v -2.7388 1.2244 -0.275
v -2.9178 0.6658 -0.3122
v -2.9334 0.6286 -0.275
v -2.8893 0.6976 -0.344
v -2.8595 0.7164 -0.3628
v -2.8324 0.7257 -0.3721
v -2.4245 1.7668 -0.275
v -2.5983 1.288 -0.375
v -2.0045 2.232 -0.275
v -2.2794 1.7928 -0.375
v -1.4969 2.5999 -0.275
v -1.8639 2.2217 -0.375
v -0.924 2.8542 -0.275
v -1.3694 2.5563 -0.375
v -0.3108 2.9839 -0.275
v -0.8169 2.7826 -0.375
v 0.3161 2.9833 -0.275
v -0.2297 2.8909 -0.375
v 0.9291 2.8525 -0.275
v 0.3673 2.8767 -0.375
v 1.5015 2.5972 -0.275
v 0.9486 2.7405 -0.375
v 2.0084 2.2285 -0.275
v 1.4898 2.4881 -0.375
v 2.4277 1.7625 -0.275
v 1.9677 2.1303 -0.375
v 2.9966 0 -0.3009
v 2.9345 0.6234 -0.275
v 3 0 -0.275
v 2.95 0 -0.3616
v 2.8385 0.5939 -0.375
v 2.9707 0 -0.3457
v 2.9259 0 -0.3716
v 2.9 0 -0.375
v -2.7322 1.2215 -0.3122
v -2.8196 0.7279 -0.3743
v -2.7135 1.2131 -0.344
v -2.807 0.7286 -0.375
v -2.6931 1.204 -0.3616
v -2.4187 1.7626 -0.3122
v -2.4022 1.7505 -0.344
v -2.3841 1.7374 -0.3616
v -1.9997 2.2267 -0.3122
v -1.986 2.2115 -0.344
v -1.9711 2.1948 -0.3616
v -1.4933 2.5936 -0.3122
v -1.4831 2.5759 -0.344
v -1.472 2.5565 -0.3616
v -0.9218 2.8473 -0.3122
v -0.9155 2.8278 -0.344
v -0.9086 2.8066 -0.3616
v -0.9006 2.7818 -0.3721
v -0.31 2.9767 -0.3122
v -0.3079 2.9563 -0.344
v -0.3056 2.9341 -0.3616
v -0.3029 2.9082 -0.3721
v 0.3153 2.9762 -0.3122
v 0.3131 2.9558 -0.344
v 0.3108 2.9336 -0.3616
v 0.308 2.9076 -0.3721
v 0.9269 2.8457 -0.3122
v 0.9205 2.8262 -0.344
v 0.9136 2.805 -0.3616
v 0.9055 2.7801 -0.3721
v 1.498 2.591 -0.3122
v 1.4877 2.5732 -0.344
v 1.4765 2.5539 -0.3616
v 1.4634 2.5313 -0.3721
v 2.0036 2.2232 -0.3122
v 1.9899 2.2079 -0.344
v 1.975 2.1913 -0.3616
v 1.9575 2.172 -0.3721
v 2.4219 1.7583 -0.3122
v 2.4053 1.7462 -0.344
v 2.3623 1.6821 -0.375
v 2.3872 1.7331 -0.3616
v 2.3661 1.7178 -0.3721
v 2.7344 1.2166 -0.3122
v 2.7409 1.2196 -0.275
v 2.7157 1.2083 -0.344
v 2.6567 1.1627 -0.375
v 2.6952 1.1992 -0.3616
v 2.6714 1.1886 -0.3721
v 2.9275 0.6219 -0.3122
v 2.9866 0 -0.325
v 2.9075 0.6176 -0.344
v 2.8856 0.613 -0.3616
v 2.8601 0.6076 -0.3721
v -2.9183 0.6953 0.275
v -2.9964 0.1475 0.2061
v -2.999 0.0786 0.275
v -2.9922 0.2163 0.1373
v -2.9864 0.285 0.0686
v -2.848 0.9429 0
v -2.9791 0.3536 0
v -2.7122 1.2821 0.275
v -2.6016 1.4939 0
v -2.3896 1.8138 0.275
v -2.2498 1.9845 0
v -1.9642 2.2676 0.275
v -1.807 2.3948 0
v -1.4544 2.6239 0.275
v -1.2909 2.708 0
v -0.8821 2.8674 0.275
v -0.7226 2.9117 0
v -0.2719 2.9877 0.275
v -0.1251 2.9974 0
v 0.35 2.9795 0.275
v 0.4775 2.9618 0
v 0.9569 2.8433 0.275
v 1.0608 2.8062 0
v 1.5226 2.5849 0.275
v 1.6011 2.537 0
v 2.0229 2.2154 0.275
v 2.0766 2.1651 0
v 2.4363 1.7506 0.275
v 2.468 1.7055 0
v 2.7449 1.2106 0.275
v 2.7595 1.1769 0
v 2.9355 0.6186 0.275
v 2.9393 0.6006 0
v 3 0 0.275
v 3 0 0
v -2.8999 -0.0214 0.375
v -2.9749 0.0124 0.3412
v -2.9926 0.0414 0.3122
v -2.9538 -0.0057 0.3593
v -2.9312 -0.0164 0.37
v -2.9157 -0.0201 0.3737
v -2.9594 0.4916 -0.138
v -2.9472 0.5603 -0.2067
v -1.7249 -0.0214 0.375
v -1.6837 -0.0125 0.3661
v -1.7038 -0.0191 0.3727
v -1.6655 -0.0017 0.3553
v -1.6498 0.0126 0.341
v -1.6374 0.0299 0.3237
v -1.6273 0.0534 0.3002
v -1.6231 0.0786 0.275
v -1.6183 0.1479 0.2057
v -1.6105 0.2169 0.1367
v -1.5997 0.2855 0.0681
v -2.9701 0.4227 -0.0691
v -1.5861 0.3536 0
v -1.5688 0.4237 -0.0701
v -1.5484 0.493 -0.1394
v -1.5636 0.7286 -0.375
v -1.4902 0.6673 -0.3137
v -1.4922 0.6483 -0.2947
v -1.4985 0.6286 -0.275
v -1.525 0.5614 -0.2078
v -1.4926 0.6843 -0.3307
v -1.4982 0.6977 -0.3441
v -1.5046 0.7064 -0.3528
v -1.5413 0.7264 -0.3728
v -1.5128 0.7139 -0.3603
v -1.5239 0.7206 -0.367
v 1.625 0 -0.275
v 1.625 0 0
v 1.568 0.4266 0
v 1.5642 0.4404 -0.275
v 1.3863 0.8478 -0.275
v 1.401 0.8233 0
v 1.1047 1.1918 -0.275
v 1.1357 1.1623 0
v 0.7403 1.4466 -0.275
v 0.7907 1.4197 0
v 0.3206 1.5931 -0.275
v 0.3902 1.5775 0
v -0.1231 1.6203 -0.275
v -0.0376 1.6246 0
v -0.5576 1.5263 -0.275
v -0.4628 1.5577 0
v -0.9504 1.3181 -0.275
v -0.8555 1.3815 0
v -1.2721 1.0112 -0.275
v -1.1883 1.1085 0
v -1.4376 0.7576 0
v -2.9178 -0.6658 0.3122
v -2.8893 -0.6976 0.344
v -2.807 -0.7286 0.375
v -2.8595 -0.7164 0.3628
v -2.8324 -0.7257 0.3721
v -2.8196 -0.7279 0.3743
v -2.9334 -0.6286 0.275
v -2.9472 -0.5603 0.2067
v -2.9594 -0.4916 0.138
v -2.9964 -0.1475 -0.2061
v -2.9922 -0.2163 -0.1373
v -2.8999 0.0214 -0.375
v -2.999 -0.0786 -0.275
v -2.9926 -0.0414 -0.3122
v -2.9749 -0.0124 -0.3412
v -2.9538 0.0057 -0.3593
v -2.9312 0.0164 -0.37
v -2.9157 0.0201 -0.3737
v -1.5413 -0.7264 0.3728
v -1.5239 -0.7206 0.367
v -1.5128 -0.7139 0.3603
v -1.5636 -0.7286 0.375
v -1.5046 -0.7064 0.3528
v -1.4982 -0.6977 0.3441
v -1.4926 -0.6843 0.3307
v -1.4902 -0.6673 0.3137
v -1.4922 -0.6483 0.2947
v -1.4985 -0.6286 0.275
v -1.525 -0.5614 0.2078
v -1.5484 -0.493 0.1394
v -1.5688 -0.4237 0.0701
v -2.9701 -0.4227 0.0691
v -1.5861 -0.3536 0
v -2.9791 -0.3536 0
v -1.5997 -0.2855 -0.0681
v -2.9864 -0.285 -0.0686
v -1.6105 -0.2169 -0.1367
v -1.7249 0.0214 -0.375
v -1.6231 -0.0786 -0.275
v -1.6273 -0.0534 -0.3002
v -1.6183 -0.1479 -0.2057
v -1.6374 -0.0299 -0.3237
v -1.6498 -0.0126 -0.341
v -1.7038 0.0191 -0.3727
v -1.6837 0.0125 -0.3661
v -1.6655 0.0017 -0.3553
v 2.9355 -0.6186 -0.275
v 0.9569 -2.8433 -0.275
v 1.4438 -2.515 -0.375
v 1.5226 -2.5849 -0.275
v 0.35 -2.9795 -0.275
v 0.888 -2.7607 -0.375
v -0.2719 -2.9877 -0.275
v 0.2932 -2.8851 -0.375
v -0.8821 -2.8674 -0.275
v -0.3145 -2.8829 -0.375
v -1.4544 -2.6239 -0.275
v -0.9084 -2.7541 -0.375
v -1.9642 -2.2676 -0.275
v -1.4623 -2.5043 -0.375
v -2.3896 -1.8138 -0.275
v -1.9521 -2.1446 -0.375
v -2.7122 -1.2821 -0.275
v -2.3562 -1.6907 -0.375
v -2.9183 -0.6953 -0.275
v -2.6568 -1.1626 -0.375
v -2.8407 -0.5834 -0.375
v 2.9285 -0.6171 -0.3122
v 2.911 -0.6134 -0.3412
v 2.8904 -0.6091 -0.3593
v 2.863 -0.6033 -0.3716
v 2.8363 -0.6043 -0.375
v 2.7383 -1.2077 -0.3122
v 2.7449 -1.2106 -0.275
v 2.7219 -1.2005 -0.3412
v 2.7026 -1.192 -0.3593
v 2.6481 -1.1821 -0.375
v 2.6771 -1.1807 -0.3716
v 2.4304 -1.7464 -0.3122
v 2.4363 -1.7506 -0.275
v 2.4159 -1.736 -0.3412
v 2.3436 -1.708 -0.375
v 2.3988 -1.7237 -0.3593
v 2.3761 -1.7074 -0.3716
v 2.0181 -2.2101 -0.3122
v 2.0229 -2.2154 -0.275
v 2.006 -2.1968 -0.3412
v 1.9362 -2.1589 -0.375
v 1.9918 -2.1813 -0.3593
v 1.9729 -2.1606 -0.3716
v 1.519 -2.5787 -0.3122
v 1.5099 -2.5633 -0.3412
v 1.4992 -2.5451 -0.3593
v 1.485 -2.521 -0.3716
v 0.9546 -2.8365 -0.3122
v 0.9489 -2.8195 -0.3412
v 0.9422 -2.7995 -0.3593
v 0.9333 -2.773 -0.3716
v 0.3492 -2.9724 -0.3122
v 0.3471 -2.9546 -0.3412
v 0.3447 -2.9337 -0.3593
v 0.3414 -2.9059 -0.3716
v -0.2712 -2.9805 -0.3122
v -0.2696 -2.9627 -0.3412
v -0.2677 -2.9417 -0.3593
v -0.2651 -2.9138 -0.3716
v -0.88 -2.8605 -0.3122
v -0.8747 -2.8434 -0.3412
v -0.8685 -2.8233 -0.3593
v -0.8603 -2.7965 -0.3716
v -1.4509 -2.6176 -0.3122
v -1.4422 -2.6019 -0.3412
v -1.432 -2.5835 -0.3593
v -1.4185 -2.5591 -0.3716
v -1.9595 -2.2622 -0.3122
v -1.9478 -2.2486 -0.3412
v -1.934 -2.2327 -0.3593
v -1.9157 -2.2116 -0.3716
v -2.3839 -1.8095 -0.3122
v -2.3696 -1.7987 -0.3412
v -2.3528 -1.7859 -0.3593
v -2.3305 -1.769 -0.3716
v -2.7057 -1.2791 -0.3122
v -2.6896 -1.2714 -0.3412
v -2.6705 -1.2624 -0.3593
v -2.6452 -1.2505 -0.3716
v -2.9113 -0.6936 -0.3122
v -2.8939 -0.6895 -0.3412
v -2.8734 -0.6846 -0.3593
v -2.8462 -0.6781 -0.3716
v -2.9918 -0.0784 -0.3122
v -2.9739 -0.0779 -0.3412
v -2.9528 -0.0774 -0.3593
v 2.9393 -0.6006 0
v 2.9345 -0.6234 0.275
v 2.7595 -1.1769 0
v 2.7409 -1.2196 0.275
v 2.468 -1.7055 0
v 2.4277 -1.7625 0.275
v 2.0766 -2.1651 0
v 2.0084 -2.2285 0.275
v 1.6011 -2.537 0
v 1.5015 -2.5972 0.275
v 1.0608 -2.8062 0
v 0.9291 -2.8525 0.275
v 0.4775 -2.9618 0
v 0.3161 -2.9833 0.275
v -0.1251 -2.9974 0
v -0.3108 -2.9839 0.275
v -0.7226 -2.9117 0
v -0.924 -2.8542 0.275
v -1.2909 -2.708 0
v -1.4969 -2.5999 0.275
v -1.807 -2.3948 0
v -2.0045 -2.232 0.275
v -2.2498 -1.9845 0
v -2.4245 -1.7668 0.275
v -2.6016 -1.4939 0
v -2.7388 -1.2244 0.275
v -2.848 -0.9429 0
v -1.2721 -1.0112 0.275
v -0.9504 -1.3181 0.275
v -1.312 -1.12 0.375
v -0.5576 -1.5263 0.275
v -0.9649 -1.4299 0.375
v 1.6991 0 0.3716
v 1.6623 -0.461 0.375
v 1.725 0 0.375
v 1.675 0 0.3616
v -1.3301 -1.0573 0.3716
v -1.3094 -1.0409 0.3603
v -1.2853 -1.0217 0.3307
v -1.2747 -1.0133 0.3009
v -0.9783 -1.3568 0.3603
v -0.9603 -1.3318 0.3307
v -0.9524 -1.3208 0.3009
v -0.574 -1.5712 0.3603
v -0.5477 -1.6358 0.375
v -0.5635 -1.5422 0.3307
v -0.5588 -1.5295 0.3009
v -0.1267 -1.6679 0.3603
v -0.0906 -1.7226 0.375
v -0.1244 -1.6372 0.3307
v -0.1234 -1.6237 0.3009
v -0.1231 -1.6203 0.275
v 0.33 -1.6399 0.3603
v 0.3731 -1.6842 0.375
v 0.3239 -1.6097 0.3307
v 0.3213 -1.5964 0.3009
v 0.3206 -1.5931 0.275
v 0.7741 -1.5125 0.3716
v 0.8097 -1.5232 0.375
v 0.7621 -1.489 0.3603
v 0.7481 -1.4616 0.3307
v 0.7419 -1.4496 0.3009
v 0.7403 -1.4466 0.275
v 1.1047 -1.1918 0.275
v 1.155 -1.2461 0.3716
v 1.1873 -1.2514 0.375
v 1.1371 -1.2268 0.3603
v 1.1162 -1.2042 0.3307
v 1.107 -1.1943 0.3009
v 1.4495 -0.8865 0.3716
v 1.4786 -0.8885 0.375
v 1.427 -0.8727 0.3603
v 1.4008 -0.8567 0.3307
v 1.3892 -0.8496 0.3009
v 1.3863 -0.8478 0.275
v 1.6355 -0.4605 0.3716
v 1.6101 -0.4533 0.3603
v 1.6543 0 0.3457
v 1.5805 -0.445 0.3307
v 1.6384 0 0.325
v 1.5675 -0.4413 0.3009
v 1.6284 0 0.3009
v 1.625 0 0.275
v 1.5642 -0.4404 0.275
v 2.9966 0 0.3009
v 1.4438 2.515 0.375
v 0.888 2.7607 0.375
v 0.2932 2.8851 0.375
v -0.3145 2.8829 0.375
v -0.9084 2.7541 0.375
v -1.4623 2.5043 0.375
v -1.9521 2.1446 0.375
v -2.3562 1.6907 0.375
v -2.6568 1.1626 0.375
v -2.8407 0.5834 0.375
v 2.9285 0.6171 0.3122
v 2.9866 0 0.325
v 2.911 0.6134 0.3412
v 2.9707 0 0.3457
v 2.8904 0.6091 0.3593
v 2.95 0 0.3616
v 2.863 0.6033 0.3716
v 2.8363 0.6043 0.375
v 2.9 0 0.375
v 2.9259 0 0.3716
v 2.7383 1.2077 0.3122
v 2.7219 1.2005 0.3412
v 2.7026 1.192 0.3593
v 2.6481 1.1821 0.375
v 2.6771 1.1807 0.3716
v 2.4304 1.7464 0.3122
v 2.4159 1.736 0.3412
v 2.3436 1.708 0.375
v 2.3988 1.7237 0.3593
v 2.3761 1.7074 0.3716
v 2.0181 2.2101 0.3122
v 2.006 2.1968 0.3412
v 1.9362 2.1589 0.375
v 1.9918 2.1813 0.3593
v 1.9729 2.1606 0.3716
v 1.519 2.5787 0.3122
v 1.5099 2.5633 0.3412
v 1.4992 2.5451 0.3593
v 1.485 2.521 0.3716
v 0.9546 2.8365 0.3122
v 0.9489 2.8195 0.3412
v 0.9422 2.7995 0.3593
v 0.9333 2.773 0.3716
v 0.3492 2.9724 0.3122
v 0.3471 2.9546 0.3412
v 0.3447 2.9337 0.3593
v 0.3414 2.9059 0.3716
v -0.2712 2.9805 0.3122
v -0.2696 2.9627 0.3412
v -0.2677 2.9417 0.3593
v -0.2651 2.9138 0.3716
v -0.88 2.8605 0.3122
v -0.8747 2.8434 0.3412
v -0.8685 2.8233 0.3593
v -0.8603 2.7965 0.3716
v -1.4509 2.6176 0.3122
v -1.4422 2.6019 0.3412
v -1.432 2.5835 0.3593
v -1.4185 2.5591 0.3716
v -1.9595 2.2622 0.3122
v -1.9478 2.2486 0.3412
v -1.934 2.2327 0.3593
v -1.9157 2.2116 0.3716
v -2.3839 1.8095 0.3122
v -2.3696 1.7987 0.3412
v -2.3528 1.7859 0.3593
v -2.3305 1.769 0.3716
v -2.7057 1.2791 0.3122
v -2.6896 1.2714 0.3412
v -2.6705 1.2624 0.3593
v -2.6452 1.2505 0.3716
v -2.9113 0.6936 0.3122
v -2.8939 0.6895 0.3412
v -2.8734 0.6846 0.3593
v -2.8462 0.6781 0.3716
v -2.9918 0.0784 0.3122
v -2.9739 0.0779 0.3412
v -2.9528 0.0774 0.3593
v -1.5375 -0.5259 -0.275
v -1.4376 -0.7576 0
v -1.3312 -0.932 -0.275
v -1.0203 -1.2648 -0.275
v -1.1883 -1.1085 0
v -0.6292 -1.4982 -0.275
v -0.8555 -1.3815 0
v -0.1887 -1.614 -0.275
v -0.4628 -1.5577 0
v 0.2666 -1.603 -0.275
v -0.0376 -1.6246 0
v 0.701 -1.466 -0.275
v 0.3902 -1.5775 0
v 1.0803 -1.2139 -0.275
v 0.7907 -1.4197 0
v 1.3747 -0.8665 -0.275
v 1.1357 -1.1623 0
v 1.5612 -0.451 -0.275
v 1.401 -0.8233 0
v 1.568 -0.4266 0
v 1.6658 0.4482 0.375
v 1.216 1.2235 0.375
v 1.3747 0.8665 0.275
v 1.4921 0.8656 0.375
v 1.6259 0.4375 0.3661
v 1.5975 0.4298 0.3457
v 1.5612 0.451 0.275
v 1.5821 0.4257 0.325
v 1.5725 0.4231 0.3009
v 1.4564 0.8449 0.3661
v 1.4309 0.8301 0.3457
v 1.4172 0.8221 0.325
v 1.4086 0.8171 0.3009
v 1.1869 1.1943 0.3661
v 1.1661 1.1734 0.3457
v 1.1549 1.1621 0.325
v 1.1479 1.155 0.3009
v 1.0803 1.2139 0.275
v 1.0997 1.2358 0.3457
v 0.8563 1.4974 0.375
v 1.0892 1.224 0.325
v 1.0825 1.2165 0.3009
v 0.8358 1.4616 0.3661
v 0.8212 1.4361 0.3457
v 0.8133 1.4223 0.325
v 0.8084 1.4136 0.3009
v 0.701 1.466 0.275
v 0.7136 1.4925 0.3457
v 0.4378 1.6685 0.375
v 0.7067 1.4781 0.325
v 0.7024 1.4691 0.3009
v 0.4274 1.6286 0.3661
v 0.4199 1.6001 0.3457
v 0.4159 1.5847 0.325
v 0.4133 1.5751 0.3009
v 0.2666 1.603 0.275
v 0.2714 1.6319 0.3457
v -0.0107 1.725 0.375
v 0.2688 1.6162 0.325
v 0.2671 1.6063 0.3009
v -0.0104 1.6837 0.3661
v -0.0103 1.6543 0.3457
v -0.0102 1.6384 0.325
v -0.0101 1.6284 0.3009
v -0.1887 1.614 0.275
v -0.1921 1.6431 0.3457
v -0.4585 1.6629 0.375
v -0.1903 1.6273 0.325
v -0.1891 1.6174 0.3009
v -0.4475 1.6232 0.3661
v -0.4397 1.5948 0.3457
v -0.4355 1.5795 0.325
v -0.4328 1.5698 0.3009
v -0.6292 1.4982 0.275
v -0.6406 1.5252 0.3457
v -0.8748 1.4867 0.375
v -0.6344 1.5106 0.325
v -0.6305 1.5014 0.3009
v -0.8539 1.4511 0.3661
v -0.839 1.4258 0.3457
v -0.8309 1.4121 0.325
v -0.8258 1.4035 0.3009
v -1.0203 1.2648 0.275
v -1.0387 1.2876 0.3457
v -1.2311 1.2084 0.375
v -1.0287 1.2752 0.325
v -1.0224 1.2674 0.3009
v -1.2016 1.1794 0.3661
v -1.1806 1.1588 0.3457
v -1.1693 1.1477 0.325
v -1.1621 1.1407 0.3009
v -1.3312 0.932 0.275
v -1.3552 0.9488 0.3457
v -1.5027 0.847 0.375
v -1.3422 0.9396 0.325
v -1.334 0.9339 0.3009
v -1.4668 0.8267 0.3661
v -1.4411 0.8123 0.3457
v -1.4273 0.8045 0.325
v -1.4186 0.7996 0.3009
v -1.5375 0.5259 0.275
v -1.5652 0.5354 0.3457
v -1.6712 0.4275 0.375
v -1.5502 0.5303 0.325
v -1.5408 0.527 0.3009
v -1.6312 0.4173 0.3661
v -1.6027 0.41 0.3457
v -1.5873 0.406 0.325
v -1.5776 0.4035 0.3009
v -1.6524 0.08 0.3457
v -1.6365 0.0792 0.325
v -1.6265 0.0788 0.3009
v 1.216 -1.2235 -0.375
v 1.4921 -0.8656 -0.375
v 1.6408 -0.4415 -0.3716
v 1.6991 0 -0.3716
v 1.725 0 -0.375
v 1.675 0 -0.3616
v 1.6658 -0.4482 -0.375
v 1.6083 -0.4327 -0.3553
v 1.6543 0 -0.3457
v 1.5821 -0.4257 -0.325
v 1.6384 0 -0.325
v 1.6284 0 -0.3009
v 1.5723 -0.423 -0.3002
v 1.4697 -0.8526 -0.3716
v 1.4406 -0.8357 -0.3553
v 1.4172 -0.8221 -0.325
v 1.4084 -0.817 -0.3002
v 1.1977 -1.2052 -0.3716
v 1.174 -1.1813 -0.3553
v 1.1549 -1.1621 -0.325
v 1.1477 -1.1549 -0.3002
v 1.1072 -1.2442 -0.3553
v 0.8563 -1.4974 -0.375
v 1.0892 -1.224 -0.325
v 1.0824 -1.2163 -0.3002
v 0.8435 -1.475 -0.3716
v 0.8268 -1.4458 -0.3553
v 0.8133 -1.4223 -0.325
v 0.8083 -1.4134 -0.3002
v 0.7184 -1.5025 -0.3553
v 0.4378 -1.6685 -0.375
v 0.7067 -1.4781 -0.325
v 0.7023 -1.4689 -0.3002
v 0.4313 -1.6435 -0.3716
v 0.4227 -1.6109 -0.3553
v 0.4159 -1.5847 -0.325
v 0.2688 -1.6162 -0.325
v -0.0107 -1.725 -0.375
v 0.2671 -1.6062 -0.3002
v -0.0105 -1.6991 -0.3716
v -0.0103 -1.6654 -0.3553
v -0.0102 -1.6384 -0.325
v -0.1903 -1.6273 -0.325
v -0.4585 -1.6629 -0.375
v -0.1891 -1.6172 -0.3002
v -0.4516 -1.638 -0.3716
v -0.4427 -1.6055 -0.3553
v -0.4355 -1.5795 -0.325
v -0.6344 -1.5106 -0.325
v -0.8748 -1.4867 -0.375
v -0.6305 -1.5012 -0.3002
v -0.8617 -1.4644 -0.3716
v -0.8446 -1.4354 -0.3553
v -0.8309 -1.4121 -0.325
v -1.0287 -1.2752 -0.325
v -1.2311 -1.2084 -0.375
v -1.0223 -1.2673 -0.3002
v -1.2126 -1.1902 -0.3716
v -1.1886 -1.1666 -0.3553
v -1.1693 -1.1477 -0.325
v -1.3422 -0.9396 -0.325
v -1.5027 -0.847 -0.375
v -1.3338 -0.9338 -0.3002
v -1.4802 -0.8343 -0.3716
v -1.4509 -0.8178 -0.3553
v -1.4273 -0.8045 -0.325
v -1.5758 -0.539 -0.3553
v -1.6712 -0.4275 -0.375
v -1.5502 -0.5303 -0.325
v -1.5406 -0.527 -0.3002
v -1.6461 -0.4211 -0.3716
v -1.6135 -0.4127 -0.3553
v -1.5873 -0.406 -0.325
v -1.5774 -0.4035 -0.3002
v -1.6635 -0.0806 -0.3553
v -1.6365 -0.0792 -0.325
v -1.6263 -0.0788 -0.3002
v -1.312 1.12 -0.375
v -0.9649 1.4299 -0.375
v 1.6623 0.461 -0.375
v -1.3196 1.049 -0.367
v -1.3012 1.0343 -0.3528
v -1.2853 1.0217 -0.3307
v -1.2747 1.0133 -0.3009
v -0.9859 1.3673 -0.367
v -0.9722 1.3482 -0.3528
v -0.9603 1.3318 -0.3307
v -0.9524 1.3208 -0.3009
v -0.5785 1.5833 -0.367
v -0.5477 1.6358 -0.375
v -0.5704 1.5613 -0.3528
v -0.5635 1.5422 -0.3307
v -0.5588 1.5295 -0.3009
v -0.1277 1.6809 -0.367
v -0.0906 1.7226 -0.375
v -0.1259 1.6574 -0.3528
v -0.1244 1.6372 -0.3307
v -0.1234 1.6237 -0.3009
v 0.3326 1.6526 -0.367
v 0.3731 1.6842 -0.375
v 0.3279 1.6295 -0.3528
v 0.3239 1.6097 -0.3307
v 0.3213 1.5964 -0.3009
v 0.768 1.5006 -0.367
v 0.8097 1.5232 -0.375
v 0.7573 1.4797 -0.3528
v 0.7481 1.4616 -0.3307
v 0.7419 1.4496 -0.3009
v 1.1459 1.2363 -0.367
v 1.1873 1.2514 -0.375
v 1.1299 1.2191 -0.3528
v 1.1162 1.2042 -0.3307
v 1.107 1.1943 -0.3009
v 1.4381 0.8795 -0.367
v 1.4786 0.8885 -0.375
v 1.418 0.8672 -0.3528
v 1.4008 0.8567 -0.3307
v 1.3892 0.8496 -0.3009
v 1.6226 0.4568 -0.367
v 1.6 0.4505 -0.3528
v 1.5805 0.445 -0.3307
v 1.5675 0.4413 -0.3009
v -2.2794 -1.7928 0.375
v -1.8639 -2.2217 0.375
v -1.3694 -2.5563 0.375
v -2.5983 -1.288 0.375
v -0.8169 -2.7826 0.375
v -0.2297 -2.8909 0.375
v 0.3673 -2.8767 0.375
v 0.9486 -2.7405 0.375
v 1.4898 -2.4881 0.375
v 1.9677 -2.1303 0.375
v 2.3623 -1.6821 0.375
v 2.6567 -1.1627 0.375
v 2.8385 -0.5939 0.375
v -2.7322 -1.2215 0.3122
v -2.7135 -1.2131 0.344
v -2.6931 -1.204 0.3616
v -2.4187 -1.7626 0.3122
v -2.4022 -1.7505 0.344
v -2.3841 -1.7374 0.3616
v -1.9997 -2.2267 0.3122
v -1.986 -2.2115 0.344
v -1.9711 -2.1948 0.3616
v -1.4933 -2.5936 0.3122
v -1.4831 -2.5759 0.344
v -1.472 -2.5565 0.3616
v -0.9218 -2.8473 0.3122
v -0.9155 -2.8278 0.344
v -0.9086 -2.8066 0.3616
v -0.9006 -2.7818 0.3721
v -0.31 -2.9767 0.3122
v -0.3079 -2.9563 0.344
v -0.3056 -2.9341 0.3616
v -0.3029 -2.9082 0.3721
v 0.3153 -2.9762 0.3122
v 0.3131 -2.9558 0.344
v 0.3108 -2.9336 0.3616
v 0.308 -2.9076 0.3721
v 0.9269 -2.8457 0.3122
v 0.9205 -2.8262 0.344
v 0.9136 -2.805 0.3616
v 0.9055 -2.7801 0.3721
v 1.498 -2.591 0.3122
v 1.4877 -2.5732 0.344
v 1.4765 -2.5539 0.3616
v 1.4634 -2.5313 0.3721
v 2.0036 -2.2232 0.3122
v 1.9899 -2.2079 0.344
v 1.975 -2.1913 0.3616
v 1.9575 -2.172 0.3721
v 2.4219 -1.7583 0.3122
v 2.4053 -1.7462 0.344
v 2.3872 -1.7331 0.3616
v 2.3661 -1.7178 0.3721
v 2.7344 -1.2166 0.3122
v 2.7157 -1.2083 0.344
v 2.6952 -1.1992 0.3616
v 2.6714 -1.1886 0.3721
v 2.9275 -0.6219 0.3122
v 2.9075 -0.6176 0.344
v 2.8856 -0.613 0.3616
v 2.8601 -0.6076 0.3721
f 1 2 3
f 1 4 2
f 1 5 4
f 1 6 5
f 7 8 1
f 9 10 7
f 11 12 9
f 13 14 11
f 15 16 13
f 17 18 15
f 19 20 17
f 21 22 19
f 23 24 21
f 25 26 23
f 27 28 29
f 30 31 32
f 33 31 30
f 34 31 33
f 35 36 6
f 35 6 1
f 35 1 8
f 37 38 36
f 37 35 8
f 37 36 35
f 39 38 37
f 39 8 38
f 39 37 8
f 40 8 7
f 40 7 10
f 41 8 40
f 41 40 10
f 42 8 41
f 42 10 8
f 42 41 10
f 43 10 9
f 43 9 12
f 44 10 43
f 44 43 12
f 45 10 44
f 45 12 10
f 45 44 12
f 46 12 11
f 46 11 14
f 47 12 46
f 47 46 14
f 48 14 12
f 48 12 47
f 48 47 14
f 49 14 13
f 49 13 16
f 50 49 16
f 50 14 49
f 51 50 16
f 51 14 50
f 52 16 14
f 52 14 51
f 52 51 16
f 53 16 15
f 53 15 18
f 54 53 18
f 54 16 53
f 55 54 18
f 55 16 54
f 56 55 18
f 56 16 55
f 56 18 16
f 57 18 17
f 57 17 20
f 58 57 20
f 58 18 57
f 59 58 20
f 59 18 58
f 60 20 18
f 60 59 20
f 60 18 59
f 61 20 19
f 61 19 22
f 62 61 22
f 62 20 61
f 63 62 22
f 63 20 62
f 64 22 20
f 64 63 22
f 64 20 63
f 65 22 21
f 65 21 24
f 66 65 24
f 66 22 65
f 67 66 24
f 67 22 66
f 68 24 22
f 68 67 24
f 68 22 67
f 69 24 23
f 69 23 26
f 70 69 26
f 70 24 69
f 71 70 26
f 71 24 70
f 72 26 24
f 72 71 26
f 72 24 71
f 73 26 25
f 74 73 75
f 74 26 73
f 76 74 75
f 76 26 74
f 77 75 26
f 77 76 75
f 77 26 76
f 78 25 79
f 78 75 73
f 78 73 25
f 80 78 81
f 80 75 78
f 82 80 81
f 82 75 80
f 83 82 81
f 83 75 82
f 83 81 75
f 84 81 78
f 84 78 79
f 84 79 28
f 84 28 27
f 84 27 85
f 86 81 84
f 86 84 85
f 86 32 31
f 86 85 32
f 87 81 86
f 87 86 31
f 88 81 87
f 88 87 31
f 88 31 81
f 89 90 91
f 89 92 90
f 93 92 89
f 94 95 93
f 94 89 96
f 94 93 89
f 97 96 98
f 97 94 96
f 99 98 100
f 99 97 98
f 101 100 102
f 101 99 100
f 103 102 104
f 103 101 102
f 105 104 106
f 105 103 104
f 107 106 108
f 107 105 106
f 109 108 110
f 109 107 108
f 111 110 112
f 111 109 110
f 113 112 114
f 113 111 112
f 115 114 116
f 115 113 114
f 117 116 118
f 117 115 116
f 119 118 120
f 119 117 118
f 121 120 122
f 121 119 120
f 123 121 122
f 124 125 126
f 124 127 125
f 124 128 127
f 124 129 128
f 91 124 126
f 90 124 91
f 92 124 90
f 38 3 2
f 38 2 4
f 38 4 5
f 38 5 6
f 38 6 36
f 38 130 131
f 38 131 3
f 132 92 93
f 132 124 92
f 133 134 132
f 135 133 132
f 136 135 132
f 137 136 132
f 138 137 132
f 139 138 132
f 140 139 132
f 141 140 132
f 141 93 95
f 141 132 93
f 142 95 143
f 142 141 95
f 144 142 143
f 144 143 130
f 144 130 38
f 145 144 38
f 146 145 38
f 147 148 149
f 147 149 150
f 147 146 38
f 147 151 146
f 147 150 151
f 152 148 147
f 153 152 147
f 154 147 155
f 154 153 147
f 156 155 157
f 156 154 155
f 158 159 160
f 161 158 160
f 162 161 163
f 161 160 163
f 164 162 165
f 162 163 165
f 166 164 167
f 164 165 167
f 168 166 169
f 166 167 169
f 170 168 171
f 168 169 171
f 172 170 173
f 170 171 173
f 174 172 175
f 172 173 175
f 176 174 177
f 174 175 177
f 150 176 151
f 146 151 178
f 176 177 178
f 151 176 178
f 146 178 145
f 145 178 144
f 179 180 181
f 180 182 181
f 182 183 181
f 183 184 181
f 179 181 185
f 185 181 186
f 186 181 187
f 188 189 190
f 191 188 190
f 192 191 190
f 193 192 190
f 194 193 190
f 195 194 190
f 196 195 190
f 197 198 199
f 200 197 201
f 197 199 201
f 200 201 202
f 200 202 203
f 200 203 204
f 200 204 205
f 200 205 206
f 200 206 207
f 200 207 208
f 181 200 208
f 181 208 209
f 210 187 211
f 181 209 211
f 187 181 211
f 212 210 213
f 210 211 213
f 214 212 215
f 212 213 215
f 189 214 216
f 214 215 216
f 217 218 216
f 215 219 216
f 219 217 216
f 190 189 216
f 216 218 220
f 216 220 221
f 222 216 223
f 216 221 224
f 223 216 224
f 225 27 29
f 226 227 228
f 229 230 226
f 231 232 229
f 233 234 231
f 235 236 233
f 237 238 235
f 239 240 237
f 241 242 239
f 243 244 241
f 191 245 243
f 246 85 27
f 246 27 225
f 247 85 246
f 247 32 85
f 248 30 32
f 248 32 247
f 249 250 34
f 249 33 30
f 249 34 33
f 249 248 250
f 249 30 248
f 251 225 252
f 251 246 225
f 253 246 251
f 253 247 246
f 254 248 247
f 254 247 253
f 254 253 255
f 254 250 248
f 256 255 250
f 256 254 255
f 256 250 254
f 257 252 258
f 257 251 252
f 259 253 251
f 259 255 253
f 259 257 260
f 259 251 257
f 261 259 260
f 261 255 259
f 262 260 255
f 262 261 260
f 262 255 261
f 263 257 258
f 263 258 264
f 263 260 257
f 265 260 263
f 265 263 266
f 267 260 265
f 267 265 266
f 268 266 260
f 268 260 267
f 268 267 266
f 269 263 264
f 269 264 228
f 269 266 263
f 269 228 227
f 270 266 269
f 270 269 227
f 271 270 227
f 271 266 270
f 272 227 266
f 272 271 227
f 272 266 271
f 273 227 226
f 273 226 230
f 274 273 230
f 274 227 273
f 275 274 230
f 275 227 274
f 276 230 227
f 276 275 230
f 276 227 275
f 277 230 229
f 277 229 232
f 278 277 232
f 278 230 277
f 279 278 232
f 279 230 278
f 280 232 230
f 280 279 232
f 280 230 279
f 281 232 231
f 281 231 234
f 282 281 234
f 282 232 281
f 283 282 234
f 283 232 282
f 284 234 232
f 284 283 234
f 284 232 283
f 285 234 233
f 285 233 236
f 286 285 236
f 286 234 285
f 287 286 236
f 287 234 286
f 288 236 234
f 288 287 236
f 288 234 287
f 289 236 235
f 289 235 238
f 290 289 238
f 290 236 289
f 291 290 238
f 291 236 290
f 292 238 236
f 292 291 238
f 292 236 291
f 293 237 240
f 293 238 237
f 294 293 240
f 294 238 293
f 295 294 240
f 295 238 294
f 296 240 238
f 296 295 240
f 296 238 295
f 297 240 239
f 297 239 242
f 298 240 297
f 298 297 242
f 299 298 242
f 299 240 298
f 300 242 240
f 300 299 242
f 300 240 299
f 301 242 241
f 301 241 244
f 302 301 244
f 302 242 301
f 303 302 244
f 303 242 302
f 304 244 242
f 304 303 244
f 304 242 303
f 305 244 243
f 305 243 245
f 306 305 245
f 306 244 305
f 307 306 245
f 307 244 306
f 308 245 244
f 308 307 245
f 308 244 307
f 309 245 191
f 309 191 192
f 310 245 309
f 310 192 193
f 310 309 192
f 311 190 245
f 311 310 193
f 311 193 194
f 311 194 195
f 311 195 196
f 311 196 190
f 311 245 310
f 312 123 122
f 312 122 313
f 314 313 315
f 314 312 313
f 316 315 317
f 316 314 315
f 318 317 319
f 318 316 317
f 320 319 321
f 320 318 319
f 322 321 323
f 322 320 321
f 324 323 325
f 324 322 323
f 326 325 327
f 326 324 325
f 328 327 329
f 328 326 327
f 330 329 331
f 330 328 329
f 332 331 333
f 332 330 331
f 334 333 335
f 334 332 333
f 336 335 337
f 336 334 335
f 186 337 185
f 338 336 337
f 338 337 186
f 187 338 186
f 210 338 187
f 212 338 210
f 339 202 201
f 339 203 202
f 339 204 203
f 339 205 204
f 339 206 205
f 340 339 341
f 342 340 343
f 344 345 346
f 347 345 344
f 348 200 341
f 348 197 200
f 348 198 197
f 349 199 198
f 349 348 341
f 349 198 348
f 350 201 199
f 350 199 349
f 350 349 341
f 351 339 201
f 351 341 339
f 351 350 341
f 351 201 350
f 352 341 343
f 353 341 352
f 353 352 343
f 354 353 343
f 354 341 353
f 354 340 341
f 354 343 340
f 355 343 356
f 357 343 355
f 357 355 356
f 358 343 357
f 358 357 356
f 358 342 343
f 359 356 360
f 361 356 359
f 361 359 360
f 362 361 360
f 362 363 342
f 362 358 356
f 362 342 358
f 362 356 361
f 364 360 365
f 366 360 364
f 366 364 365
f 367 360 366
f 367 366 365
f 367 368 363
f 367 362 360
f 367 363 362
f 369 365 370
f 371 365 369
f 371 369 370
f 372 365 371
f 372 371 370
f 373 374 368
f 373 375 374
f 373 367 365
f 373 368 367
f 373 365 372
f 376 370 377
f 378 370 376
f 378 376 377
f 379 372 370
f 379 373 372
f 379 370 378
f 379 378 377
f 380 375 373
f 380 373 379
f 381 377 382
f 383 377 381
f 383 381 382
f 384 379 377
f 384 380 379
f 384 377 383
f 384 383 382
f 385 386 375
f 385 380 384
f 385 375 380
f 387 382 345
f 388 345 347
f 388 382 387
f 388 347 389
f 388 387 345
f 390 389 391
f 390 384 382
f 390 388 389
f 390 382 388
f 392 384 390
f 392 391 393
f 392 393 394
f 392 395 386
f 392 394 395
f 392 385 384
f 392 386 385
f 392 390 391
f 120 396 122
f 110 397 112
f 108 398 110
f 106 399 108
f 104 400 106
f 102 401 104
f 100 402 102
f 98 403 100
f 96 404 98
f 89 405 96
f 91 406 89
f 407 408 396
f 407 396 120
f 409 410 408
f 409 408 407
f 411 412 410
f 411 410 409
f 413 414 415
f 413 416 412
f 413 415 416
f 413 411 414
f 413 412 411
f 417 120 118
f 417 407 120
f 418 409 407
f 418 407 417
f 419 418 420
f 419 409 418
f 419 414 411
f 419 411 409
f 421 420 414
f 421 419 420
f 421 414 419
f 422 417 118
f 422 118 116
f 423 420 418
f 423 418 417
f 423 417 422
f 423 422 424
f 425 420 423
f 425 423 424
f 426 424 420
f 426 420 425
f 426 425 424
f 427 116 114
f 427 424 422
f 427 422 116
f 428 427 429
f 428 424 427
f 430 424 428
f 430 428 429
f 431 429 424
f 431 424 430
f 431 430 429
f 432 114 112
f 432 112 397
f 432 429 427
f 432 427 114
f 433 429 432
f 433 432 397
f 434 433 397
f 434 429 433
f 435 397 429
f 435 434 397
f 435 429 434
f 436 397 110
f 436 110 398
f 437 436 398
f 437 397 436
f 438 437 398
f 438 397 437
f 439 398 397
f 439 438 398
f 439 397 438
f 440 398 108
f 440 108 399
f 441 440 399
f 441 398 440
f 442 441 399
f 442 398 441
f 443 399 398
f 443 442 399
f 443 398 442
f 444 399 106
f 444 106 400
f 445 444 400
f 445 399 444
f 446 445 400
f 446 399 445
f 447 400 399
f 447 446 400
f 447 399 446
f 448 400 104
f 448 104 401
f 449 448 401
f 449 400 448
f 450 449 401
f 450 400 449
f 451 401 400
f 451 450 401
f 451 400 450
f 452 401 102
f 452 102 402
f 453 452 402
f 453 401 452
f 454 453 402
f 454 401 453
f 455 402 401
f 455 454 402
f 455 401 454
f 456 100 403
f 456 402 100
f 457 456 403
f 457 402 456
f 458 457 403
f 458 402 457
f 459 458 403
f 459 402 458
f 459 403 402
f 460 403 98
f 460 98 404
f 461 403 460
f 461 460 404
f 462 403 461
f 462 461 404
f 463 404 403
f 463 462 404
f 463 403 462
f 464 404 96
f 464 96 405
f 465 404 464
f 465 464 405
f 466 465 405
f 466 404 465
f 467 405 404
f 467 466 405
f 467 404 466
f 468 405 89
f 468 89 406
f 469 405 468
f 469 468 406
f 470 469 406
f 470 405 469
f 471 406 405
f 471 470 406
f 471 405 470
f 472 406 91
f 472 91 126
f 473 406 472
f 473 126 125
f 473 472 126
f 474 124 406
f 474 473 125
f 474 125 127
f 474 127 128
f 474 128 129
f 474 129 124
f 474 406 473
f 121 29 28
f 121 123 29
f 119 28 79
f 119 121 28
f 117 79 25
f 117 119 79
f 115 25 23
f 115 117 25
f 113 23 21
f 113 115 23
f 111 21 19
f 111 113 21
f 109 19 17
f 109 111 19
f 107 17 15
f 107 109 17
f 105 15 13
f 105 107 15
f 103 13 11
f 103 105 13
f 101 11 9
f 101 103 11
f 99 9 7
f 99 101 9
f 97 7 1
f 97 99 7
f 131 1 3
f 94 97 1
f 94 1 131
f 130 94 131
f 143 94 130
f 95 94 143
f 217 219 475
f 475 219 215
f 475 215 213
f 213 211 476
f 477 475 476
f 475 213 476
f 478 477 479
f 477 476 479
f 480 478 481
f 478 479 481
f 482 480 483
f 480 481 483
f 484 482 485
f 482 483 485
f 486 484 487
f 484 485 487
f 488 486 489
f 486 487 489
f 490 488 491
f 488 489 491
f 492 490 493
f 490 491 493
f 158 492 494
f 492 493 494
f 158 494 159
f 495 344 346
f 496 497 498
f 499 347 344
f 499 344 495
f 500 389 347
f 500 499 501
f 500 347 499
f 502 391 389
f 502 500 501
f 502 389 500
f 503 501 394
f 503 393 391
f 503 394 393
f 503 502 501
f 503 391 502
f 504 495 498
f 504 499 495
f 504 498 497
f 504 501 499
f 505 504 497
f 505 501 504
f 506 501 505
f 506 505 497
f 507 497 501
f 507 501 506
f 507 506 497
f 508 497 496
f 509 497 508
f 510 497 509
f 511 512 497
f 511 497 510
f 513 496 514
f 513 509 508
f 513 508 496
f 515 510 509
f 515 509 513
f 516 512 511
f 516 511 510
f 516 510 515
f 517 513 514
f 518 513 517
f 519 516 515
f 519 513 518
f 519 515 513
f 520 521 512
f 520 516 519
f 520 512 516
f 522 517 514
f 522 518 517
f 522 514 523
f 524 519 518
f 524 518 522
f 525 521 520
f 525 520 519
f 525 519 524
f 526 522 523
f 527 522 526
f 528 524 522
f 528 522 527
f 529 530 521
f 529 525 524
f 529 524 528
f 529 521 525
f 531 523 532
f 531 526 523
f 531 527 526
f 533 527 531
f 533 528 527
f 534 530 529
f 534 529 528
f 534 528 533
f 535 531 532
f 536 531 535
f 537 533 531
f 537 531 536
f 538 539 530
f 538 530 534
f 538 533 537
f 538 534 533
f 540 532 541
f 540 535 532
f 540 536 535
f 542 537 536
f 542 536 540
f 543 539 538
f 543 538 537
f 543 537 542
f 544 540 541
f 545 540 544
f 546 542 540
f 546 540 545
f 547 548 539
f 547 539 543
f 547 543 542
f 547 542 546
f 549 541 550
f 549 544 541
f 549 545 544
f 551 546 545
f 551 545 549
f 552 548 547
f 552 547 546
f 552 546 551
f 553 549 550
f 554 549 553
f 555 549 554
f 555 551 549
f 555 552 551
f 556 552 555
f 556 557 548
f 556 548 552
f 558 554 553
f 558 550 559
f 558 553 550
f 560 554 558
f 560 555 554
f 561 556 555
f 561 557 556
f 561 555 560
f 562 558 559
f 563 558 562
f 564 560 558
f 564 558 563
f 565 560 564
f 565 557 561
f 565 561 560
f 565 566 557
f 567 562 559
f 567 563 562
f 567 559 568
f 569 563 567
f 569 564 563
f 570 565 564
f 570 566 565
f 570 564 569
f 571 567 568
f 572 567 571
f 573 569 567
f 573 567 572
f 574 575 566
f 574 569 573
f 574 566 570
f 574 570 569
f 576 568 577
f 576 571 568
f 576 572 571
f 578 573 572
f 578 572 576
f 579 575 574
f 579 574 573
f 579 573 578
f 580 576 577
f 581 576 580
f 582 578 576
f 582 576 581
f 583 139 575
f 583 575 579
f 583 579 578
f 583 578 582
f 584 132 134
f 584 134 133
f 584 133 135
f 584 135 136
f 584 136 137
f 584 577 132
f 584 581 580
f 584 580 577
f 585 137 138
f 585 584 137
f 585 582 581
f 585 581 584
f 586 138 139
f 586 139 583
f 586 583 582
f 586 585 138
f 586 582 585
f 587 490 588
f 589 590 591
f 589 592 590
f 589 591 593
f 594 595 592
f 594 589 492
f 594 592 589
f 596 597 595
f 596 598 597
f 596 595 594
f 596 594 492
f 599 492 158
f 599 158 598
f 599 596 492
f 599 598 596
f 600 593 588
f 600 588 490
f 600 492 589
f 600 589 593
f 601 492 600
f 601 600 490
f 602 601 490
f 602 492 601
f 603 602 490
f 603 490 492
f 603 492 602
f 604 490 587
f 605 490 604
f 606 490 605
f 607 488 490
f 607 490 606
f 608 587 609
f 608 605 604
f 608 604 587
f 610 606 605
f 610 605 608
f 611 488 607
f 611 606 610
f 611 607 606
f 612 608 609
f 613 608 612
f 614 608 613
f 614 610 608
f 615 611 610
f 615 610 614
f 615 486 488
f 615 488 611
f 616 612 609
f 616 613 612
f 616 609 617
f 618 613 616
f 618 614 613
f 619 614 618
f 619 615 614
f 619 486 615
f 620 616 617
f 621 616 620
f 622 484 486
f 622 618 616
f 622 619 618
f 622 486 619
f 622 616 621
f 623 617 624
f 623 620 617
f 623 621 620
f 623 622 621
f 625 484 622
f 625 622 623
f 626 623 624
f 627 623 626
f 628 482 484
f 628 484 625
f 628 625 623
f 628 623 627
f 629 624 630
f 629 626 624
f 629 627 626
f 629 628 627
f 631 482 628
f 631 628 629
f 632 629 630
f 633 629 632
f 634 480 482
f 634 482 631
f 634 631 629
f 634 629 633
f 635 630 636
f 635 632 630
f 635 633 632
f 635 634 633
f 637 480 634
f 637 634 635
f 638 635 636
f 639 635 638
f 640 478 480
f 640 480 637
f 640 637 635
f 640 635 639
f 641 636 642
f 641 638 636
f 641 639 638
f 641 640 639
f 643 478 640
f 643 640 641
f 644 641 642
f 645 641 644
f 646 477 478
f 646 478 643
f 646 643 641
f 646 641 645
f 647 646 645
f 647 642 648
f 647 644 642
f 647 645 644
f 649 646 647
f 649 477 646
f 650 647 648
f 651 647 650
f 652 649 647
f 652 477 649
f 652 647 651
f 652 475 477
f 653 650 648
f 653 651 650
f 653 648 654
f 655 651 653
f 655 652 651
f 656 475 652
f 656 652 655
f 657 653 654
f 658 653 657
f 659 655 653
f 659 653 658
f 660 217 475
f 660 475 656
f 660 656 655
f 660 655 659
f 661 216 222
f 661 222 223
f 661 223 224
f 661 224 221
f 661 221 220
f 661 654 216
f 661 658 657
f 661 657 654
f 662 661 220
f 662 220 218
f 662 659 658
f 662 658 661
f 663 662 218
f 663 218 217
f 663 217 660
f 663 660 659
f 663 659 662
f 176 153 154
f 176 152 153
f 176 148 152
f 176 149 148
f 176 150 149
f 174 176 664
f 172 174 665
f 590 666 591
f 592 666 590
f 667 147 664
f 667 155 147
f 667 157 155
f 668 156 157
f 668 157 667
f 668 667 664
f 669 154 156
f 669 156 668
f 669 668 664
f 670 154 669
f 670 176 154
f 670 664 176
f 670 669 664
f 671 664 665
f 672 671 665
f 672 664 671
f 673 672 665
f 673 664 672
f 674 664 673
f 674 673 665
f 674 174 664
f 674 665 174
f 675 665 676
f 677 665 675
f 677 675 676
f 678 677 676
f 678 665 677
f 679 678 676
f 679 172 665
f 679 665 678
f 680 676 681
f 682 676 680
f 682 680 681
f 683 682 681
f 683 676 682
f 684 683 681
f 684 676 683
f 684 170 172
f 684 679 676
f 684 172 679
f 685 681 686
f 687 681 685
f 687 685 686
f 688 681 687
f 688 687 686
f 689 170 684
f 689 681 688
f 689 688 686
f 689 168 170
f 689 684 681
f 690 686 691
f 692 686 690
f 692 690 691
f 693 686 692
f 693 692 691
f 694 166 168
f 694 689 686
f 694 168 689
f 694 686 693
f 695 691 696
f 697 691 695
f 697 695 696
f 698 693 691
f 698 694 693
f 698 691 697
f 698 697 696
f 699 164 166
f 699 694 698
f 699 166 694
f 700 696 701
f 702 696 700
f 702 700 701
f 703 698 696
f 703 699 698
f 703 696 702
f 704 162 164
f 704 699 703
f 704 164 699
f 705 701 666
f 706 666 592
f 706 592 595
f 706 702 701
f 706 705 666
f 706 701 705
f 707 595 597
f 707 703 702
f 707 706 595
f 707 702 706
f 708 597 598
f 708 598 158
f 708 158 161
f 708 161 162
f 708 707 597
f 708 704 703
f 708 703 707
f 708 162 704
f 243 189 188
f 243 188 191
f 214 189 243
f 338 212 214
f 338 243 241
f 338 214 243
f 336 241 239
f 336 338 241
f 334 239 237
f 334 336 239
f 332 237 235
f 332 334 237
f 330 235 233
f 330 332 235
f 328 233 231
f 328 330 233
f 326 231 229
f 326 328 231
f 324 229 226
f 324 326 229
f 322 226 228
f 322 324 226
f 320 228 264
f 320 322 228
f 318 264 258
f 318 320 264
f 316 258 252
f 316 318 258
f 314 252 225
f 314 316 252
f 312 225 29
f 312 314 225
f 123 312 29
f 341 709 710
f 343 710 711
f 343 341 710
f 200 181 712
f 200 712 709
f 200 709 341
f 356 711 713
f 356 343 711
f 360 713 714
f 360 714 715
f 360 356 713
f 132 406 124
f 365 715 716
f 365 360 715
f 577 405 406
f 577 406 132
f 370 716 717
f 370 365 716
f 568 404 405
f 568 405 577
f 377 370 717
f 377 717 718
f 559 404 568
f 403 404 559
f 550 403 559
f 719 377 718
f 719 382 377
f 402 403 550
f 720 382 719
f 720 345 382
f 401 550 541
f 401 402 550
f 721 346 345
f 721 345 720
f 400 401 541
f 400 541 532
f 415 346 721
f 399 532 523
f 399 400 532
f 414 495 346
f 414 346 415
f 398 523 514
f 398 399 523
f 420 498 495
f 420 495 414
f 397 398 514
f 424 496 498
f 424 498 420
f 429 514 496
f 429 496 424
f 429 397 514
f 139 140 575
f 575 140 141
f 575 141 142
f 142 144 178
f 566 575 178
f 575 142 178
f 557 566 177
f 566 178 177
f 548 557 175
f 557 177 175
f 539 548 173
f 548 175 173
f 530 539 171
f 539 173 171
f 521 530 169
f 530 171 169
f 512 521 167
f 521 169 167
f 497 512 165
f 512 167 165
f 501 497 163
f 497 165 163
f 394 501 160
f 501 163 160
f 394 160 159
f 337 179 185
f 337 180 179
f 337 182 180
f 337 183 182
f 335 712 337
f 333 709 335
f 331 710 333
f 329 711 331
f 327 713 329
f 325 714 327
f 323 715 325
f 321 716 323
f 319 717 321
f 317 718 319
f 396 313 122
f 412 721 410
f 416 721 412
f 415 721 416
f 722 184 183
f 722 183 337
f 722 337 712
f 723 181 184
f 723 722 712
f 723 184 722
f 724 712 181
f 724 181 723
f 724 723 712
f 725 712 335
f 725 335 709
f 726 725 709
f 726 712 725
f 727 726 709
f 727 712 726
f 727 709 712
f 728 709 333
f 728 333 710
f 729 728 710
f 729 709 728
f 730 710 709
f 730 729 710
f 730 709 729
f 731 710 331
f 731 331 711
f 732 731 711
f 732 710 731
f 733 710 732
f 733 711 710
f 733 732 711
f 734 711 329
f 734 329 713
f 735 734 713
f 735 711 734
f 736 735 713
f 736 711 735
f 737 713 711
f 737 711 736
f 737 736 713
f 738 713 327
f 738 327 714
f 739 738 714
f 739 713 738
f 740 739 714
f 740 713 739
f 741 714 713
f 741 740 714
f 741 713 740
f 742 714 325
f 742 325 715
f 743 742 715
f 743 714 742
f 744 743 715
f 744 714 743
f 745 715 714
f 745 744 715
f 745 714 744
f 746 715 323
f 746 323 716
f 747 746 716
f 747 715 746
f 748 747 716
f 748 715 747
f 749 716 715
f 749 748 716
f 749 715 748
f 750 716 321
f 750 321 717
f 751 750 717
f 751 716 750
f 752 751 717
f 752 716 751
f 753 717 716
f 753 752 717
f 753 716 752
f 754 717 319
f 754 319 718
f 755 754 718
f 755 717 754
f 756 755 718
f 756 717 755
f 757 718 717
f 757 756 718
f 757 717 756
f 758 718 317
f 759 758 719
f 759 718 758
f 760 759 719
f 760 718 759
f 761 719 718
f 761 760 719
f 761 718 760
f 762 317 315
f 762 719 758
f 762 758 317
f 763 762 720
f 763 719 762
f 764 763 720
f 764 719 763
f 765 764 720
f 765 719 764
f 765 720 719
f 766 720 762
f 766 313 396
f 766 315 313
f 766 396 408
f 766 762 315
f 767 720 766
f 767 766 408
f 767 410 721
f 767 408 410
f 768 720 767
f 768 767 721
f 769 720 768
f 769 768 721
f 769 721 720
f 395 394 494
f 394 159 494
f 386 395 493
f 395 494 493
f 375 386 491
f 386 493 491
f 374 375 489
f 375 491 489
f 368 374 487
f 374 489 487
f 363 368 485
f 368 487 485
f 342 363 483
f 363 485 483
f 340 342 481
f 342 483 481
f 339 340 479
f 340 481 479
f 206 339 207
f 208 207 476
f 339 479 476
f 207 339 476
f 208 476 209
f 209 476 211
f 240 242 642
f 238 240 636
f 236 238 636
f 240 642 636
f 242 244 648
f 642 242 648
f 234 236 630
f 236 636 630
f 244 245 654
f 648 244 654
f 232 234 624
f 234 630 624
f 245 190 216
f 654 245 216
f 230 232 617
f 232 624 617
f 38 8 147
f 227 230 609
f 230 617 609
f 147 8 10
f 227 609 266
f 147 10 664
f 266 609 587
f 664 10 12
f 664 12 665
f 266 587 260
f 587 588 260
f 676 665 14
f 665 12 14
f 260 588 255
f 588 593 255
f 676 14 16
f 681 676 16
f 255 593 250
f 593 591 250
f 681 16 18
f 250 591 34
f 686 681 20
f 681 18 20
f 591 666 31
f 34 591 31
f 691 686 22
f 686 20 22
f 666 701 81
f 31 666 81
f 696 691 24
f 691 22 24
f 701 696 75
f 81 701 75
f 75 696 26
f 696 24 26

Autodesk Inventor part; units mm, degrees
ref_plane "YZ Plane" through (0, 0, 0) normal (1, 0, 0) x (0, 1, 0)
ref_plane "XZ Plane" through (0, 0, 0) normal (0, 1, 0) x (-1, 0, 0)
ref_plane "XY Plane" through (0, 0, 0) normal (0, 0, 1) x (1, 0, 0)
sketch "Sketch1" plane through (0, 0, 0) normal (0, 0, 1) x (1, 0, 0)
  circle A0 centre (0, 0) radius 3
  circle A1 centre (0, 0) radius 1.625
  dimension "d0" = 6
  dimension "d1" = 3.25
extrude "Extrusion1" add sketch "Sketch1" along normal mid plane 0.75
sketch "Sketch2" plane through (0, 0, 0) normal (1, 0, 0) x (0, 1, 0)
  line L0 (-1.625, 0.375) -> (1.625, 0.375) construction
  line L1 (1.625, -0.375) -> (-1.625, -0.375) construction
  line L2 (0, 0) -> (0, 0.375) construction
  line L3 (0, 0) -> (-0.375, 0.375) construction
  line L4 (-0.7286, 0.375) -> (0.0214, -0.375)
  line L5 (-0.0214, 0.375) -> (0.7286, -0.375)
  line L6 (0.0214, -0.375) -> (0.7286, -0.375)
  line L7 (-0.0214, 0.375) -> (-0.7286, 0.375)
  dimension "d5" = 0.5
  dimension "d9" = 45
extrude "Extrusion2" cut sketch "Sketch2" against normal through all
fillet "Fillet1" radius 0.1 8 edges at (-0.0107, 3, 0.375) (0.367, -2.9775, 0.375) (0.367, 2.9775, -0.375) (-0.0107, -3, -0.375) (0.3743, -1.5813, 0.375) (-0.0107, 1.625, 0.375) (-0.0107, -1.625, -0.375) (0.3743, 1.5813, -0.375)
properties part number "Lock Washer"
